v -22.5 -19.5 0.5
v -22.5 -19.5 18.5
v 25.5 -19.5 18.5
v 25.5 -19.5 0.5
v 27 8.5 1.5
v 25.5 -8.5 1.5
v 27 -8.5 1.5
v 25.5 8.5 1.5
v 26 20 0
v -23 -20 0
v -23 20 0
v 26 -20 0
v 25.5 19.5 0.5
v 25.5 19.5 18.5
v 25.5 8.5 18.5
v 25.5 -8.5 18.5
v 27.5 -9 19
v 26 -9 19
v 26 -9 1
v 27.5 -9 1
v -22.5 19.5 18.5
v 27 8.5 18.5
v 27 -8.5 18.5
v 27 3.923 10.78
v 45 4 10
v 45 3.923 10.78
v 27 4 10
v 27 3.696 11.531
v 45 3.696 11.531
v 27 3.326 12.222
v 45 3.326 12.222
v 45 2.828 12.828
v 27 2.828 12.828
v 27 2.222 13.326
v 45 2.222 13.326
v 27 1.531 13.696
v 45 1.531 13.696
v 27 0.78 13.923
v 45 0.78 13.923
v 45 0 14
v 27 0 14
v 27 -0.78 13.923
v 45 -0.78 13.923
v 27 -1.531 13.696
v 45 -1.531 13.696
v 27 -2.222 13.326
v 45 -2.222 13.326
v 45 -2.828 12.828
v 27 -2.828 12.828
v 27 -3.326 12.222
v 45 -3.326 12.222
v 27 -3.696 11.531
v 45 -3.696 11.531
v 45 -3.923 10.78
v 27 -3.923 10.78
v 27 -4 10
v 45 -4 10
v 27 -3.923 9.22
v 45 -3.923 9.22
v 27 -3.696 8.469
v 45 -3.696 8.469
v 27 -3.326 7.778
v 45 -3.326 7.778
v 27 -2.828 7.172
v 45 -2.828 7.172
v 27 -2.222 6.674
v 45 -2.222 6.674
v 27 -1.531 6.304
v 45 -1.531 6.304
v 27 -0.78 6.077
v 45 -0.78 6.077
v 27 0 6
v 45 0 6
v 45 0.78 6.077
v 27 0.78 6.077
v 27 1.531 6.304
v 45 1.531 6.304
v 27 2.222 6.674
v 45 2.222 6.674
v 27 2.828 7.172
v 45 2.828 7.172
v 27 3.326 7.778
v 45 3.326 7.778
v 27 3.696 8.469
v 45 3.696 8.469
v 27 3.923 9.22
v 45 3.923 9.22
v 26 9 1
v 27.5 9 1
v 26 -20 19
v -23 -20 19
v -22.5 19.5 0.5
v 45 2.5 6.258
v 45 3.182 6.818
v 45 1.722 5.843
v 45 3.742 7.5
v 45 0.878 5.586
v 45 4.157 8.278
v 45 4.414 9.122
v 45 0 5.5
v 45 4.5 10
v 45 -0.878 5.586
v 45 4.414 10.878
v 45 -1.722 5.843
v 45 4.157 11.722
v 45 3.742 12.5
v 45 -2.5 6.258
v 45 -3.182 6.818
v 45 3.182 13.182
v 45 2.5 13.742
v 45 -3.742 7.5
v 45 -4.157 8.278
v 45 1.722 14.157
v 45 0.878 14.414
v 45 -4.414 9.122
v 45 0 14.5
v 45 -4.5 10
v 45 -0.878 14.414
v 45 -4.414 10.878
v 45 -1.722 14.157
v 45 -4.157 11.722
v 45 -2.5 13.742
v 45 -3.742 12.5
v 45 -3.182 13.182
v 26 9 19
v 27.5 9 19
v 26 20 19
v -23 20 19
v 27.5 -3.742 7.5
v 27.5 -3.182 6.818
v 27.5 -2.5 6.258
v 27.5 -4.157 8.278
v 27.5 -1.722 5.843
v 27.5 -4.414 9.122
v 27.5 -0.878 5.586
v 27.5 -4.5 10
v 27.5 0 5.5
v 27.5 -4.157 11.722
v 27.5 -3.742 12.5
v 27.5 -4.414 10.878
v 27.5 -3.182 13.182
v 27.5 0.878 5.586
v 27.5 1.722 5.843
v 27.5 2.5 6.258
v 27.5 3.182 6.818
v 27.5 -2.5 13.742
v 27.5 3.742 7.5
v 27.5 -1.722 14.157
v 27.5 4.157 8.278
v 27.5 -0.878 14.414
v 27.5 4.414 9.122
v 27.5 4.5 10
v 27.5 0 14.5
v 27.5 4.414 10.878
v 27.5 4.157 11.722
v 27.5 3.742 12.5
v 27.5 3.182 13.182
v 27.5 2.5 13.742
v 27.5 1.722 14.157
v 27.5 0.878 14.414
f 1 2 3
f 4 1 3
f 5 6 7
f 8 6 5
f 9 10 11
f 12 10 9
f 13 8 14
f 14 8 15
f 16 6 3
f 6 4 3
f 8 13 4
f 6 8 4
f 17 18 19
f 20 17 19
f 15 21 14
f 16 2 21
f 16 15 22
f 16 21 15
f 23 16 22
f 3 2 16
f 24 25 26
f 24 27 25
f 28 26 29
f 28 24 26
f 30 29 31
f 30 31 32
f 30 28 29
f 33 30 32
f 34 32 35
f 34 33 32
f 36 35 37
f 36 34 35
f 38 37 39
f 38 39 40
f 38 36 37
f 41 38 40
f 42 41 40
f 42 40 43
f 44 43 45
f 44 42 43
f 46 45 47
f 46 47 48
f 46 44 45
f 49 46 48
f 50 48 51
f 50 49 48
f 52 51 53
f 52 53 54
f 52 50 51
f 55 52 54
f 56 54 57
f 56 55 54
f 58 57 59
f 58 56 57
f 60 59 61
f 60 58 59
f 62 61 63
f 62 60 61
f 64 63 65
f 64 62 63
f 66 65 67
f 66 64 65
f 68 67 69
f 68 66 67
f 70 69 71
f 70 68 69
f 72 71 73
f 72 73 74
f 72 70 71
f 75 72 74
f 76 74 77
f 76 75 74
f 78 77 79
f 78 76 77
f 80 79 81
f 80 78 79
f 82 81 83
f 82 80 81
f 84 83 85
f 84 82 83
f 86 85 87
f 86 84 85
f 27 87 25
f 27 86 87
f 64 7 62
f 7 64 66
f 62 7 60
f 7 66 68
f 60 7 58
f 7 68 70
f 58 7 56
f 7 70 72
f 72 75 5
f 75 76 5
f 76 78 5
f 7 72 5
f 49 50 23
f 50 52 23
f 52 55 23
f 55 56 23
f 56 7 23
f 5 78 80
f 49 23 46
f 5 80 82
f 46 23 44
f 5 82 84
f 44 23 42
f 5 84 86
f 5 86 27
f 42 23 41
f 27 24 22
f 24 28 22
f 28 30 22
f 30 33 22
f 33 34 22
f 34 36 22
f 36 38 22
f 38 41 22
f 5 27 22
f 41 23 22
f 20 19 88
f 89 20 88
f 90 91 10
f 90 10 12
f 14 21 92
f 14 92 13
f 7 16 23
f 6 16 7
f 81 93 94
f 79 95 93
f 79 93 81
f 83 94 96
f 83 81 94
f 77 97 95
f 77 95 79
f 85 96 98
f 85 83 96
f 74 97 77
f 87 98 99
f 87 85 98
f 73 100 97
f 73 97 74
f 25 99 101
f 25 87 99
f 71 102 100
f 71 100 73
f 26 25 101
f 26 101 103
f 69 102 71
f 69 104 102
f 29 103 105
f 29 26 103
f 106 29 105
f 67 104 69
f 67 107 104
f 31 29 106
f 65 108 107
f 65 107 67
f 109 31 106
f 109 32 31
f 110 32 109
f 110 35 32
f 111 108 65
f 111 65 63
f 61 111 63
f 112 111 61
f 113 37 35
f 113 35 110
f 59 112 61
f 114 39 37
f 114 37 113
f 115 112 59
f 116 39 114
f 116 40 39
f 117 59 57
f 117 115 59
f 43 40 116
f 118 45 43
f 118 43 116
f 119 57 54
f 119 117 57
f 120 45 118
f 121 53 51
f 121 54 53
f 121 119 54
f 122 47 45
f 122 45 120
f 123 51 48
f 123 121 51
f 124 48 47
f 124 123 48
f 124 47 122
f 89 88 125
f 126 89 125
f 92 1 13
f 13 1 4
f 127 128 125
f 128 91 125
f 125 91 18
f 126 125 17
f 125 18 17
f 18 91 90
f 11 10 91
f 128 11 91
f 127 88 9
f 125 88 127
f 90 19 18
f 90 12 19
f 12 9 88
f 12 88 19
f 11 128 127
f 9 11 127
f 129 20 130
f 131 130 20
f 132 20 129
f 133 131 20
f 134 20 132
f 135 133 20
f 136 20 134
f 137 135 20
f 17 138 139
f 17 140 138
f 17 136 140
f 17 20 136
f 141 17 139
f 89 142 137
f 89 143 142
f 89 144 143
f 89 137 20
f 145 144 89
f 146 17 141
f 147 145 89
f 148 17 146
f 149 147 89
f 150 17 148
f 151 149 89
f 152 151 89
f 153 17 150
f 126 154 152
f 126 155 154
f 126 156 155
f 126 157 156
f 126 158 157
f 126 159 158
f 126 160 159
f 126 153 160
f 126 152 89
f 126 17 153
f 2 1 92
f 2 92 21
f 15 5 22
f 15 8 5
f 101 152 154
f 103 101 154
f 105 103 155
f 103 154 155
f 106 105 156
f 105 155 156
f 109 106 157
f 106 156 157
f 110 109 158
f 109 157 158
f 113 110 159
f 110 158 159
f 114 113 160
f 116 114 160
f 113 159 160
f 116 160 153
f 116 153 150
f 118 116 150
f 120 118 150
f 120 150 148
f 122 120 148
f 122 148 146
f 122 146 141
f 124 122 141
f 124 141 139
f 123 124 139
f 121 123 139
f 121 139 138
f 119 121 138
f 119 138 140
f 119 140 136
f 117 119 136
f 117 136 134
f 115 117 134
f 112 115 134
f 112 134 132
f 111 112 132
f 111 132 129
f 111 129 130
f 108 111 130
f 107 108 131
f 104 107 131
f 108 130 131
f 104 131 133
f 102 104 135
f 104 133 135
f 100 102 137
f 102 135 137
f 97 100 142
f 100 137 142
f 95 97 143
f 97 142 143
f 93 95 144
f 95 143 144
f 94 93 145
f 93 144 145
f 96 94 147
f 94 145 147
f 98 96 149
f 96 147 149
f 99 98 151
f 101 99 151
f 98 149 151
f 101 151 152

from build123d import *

# Parameters (mm, degrees)
F0_W        = 49
F0_H        = 19
F1_DEPTH    = 20
F2_R        = 4.5
F3_DEPTH    = 1.5
F4_DEPTH    = 19
F5_T        = 0.5
F5_T3_DEPTH = 19
F5_T5_DEPTH = 19


# Not quite as in the source:
# - a shell that OpenCascade refuses in one call is made with other operations: the cavity is built on its own and cut out


with BuildPart() as f1:
    # F0 (on Front) → F1 (new body, symmetric)
    with BuildSketch(Plane.XZ):
        with Locations((1.5, 9.5)):
            Rectangle(F0_W, F0_H)
    extrude(amount=F1_DEPTH, both=True)

    # F2 (on face) → F3 (join)
    with BuildSketch(Plane.YZ.offset(26)):
        Polygon((-9, 19), (-9, 1), (0, 1), (9, 1), (9, 19), (0, 19), align=None)
        with Locations((0, 10)):
            Circle(F2_R, mode=Mode.SUBTRACT)
    extrude(amount=F3_DEPTH)

    # F4 (add): a face of the model
    f4_faces = [f1.faces().sort_by_distance(p)[0] for p in [
        (26, 0, 10),
    ]]
    extrude(f4_faces, amount=F4_DEPTH)

    # F5: shell of thickness 0.5, made by hand


with BuildPart() as f5_core1:
    # F5_t2: copy of F1
    add(f1.part)

    # the walls: a layer under each face that stays
    f5_faces = [f5_core1.faces().sort_by_distance(p)[0] for p in [
        (2.25, 0, 19),
        (1.5, 20, 9.5),
        (-23, 0, 9.5),
        (1.5, -20, 9.5),
        (26, 13.3333333333, 3.1666666667),
        (26.75, -9, 10),
        (27.5, -6, 4),
        (26.75, 9, 10),
        (1.5, 0, 0),
        (26.75, 0, 1),
        (36.25, -4.5, 10),
    ]]
    thicken(f5_faces, amount=-F5_T, mode=Mode.SUBTRACT)

    # F5_s4 → F5_t3 (cut)
    with BuildSketch(Plane.XY.offset(0.5)):
        Polygon((26.005, -9.005), (25.5, -9), (25.5, -8.5), (26, -8.5), align=None)
        Polygon((26.005, 9.005), (25.5, 9), (25.5, 8.5), (26, 8.5), align=None)
    extrude(amount=F5_T3_DEPTH, mode=Mode.SUBTRACT)

    # F5_s6 → F5_t5 (cut)
    with BuildSketch(Plane.XZ.offset(-9.5)):
        Polygon((26.005, 0.995), (25.5, 1), (25.5, 1.5), (26, 1.5), align=None)
    extrude(amount=F5_T5_DEPTH, mode=Mode.SUBTRACT)

    # F5_s7 → F5_t8 (revolve, cut)
    with BuildSketch(Plane.XY.offset(10)):
        Polygon((27.505, 4.505), (27, 4.5), (27, 4), (27.5, 4), align=None)
    revolve(axis=Axis((27.5, 0, 10), (1, 0, 0)), mode=Mode.SUBTRACT)


with BuildPart() as f1_1:
    add(f1.part)

    # what is left inside the walls is the cavity
    f5_cavity = [f5_core1.part.solids().sort_by_distance(p)[0] for p in [
        (2.25, 6.5, 18.495),
    ]]
    add(f5_cavity, mode=Mode.SUBTRACT)


solid = f1_1.part
